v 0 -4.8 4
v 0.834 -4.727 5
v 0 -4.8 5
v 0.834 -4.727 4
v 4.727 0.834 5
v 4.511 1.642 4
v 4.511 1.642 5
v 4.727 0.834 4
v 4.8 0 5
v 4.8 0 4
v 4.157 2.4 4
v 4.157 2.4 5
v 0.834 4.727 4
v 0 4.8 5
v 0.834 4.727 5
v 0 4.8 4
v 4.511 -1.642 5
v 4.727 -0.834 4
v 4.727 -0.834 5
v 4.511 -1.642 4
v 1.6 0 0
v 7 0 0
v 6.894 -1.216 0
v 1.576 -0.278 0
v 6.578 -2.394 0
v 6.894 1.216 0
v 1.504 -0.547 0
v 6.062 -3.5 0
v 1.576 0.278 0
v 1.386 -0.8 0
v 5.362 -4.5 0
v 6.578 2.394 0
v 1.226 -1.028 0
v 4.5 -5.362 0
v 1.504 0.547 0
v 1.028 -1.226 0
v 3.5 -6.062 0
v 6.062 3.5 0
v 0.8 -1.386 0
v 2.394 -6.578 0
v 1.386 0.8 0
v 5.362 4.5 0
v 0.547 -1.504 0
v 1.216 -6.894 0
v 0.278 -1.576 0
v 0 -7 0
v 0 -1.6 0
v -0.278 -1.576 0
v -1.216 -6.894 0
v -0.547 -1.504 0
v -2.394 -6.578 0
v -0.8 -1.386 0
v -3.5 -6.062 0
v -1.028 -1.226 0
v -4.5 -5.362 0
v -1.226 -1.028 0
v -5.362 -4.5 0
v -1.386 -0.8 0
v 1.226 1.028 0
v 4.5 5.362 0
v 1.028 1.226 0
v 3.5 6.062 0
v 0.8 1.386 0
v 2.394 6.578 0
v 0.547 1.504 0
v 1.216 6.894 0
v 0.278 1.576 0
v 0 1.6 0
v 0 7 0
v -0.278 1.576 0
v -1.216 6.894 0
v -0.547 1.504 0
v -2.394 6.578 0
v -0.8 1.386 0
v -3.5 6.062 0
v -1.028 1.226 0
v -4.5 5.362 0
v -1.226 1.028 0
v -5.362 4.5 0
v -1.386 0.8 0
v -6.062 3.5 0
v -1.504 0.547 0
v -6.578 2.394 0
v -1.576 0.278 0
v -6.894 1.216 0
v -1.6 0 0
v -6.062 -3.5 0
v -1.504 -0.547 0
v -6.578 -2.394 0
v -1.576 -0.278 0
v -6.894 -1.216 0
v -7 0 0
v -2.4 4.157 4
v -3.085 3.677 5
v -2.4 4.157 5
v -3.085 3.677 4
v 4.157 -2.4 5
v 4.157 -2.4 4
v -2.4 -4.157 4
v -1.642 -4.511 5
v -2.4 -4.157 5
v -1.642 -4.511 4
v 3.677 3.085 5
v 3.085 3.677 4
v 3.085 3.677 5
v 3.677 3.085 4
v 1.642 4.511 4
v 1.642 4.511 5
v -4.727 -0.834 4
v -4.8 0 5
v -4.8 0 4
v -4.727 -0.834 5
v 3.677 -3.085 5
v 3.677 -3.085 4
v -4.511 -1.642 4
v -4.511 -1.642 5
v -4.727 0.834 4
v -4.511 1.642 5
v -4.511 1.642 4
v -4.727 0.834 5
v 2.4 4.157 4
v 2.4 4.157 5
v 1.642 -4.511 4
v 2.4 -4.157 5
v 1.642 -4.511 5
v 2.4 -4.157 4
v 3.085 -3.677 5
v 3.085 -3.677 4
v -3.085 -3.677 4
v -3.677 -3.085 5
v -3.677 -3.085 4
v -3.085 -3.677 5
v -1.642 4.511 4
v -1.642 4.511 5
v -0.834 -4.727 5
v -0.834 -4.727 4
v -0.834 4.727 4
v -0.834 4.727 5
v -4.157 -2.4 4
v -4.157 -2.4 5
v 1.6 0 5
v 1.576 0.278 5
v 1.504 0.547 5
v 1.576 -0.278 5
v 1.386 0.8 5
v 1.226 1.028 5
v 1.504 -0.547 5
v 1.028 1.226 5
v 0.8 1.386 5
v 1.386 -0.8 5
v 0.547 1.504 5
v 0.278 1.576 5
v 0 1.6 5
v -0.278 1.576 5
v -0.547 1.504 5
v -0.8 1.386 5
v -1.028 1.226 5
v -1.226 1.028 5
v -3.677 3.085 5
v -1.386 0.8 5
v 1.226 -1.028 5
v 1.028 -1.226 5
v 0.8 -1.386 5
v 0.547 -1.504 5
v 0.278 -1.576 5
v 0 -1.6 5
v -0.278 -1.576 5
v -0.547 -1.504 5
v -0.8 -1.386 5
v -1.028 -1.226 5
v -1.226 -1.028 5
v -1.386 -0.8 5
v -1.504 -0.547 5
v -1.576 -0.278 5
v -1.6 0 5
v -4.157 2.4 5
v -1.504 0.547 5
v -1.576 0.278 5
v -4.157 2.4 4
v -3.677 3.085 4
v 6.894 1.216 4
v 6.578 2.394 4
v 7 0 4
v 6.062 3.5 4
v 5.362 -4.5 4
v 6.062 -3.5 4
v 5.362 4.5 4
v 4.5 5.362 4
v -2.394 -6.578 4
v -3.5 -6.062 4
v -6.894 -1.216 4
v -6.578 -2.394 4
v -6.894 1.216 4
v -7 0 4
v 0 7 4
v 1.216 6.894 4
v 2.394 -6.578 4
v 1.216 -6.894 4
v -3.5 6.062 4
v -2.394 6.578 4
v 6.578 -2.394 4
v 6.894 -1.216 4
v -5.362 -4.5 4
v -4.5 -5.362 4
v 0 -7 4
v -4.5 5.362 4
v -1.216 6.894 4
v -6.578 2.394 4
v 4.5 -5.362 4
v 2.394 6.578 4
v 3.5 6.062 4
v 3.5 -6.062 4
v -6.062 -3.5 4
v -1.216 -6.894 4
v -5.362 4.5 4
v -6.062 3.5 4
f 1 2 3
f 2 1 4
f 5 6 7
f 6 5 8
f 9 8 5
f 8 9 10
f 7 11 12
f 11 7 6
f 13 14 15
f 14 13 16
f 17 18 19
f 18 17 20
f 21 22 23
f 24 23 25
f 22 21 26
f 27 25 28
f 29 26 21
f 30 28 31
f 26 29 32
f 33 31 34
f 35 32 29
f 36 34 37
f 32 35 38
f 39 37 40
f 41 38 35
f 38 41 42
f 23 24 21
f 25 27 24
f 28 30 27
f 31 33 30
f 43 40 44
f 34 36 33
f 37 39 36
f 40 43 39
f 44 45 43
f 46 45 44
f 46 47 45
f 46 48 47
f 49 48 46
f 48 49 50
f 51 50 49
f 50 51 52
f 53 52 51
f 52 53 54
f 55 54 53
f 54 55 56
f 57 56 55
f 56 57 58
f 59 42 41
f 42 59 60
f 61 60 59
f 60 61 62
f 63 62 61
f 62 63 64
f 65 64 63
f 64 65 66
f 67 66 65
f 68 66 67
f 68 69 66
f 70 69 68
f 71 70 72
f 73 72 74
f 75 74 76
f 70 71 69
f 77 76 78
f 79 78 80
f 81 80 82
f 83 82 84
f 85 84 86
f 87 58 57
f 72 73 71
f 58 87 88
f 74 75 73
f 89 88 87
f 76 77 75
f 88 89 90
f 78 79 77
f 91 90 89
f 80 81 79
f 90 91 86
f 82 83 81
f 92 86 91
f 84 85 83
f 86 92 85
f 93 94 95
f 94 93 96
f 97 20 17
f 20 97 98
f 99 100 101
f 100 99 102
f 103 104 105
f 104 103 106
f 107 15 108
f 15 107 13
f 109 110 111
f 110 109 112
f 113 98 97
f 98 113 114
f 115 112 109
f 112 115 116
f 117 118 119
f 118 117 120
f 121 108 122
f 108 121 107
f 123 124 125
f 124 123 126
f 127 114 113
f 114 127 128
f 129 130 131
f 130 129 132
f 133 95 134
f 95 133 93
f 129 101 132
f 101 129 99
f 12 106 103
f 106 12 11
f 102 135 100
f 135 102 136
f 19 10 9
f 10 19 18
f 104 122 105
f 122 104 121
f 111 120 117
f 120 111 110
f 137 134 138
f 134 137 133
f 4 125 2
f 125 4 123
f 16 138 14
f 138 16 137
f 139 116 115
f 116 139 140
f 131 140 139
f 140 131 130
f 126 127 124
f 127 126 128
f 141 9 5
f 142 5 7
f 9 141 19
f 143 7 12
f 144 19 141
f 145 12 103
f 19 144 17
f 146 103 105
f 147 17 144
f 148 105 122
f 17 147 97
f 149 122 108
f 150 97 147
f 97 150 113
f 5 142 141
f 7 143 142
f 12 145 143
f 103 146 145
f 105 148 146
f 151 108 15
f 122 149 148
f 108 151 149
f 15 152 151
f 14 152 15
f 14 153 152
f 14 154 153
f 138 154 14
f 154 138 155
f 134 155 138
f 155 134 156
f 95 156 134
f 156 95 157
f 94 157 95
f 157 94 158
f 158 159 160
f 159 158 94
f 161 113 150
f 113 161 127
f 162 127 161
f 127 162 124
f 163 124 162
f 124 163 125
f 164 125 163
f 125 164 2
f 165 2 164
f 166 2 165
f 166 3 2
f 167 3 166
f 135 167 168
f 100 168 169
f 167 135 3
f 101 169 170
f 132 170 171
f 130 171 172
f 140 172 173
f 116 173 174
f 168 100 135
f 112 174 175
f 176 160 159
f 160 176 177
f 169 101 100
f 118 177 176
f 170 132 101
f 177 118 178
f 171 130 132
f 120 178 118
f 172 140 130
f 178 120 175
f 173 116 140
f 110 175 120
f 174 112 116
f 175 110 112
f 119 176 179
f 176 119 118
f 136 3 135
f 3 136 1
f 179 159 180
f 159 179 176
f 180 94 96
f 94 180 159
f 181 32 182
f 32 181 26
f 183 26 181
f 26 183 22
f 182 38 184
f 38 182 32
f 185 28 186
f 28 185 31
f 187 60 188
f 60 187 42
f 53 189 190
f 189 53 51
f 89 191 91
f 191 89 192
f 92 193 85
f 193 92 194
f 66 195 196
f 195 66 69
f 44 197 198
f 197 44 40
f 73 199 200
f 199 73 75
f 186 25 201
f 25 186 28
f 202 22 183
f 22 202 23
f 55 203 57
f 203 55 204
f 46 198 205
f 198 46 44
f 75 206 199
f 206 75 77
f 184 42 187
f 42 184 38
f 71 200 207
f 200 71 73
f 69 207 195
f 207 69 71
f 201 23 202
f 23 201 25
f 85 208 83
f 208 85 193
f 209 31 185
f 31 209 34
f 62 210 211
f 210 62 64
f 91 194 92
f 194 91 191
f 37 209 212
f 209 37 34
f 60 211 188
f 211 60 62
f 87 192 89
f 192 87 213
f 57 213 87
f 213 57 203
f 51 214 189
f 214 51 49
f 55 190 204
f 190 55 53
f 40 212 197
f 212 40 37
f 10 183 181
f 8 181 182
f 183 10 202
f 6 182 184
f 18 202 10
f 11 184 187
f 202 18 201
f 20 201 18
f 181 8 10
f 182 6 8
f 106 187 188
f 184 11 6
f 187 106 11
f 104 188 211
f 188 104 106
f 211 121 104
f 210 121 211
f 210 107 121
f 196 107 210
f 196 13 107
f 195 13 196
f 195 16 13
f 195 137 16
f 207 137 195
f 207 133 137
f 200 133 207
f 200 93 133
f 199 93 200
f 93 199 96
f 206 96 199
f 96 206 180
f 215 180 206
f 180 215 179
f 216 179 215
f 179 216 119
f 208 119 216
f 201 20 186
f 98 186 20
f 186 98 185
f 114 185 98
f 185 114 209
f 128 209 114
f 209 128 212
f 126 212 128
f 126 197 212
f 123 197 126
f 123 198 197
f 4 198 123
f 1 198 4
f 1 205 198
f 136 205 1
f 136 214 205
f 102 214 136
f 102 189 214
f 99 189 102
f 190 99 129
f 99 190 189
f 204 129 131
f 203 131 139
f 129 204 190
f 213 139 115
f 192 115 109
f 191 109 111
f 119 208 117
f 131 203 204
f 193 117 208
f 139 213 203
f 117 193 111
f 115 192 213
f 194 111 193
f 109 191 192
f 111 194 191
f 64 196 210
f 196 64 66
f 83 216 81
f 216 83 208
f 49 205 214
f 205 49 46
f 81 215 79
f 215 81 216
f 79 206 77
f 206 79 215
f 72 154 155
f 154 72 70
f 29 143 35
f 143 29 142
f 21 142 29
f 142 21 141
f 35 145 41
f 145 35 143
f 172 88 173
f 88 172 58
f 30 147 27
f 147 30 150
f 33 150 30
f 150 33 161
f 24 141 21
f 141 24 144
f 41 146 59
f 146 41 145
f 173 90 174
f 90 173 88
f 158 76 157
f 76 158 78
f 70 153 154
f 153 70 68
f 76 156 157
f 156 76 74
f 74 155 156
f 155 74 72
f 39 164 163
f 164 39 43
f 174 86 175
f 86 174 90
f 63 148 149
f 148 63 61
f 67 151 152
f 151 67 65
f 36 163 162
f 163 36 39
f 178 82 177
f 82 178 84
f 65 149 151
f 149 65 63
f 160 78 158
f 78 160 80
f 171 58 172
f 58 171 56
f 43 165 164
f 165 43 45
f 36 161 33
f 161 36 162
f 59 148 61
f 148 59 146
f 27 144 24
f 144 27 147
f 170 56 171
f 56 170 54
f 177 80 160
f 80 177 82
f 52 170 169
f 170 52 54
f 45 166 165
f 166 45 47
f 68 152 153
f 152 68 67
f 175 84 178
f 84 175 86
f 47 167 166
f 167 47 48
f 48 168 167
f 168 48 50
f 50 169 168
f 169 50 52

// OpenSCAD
postDia = 9.6;
postHeight = 5;
shoulderDia = 14;
shoulderHeight = 4;
holeDia = 3.2;

difference() {
union() {
	cylinder($fn=36,r=postDia/2,h=postHeight);
	cylinder($fn=36,r=shoulderDia/2,h=shoulderHeight);	
}

cylinder($fn=36,r=holeDia/2,h=15);
}
